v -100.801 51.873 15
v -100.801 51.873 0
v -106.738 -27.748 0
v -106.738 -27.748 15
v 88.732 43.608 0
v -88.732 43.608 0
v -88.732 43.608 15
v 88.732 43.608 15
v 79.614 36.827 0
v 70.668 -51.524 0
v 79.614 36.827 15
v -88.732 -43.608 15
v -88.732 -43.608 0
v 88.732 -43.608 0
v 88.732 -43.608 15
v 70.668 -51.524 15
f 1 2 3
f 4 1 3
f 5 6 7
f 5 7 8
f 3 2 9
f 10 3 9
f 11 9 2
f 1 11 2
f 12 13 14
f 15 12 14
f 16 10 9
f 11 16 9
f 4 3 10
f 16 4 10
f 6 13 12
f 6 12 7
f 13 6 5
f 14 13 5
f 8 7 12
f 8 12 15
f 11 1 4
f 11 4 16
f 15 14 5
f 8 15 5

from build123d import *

# Parameters (mm, degrees)
SKIZZE1_W                       = 177.46438251
SKIZZE1_H                       = 87.215049504
AUFSATZ_LINEAR_AUSTRAGEN1_DEPTH = 15
AUFSATZ_LINEAR_AUSTRAGEN2_DEPTH = 15


with BuildPart() as part:
    # Skizze1 → Aufsatz-Linear austragen1 (new body)
    with BuildSketch(Plane.XY):
        Rectangle(SKIZZE1_W, SKIZZE1_H)
    extrude(amount=AUFSATZ_LINEAR_AUSTRAGEN1_DEPTH)


with BuildPart() as body_2:
    # Skizze2 → Aufsatz-Linear austragen2 (new body)
    with BuildSketch(Plane.XY):
        Polygon((70.668259519, -51.523908356), (79.61386178, 36.827206877), (-100.800517253, 51.873409078), (-106.73768376, -27.747764706), align=None)
    extrude(amount=AUFSATZ_LINEAR_AUSTRAGEN2_DEPTH)


solid = Compound([part.part, body_2.part])
